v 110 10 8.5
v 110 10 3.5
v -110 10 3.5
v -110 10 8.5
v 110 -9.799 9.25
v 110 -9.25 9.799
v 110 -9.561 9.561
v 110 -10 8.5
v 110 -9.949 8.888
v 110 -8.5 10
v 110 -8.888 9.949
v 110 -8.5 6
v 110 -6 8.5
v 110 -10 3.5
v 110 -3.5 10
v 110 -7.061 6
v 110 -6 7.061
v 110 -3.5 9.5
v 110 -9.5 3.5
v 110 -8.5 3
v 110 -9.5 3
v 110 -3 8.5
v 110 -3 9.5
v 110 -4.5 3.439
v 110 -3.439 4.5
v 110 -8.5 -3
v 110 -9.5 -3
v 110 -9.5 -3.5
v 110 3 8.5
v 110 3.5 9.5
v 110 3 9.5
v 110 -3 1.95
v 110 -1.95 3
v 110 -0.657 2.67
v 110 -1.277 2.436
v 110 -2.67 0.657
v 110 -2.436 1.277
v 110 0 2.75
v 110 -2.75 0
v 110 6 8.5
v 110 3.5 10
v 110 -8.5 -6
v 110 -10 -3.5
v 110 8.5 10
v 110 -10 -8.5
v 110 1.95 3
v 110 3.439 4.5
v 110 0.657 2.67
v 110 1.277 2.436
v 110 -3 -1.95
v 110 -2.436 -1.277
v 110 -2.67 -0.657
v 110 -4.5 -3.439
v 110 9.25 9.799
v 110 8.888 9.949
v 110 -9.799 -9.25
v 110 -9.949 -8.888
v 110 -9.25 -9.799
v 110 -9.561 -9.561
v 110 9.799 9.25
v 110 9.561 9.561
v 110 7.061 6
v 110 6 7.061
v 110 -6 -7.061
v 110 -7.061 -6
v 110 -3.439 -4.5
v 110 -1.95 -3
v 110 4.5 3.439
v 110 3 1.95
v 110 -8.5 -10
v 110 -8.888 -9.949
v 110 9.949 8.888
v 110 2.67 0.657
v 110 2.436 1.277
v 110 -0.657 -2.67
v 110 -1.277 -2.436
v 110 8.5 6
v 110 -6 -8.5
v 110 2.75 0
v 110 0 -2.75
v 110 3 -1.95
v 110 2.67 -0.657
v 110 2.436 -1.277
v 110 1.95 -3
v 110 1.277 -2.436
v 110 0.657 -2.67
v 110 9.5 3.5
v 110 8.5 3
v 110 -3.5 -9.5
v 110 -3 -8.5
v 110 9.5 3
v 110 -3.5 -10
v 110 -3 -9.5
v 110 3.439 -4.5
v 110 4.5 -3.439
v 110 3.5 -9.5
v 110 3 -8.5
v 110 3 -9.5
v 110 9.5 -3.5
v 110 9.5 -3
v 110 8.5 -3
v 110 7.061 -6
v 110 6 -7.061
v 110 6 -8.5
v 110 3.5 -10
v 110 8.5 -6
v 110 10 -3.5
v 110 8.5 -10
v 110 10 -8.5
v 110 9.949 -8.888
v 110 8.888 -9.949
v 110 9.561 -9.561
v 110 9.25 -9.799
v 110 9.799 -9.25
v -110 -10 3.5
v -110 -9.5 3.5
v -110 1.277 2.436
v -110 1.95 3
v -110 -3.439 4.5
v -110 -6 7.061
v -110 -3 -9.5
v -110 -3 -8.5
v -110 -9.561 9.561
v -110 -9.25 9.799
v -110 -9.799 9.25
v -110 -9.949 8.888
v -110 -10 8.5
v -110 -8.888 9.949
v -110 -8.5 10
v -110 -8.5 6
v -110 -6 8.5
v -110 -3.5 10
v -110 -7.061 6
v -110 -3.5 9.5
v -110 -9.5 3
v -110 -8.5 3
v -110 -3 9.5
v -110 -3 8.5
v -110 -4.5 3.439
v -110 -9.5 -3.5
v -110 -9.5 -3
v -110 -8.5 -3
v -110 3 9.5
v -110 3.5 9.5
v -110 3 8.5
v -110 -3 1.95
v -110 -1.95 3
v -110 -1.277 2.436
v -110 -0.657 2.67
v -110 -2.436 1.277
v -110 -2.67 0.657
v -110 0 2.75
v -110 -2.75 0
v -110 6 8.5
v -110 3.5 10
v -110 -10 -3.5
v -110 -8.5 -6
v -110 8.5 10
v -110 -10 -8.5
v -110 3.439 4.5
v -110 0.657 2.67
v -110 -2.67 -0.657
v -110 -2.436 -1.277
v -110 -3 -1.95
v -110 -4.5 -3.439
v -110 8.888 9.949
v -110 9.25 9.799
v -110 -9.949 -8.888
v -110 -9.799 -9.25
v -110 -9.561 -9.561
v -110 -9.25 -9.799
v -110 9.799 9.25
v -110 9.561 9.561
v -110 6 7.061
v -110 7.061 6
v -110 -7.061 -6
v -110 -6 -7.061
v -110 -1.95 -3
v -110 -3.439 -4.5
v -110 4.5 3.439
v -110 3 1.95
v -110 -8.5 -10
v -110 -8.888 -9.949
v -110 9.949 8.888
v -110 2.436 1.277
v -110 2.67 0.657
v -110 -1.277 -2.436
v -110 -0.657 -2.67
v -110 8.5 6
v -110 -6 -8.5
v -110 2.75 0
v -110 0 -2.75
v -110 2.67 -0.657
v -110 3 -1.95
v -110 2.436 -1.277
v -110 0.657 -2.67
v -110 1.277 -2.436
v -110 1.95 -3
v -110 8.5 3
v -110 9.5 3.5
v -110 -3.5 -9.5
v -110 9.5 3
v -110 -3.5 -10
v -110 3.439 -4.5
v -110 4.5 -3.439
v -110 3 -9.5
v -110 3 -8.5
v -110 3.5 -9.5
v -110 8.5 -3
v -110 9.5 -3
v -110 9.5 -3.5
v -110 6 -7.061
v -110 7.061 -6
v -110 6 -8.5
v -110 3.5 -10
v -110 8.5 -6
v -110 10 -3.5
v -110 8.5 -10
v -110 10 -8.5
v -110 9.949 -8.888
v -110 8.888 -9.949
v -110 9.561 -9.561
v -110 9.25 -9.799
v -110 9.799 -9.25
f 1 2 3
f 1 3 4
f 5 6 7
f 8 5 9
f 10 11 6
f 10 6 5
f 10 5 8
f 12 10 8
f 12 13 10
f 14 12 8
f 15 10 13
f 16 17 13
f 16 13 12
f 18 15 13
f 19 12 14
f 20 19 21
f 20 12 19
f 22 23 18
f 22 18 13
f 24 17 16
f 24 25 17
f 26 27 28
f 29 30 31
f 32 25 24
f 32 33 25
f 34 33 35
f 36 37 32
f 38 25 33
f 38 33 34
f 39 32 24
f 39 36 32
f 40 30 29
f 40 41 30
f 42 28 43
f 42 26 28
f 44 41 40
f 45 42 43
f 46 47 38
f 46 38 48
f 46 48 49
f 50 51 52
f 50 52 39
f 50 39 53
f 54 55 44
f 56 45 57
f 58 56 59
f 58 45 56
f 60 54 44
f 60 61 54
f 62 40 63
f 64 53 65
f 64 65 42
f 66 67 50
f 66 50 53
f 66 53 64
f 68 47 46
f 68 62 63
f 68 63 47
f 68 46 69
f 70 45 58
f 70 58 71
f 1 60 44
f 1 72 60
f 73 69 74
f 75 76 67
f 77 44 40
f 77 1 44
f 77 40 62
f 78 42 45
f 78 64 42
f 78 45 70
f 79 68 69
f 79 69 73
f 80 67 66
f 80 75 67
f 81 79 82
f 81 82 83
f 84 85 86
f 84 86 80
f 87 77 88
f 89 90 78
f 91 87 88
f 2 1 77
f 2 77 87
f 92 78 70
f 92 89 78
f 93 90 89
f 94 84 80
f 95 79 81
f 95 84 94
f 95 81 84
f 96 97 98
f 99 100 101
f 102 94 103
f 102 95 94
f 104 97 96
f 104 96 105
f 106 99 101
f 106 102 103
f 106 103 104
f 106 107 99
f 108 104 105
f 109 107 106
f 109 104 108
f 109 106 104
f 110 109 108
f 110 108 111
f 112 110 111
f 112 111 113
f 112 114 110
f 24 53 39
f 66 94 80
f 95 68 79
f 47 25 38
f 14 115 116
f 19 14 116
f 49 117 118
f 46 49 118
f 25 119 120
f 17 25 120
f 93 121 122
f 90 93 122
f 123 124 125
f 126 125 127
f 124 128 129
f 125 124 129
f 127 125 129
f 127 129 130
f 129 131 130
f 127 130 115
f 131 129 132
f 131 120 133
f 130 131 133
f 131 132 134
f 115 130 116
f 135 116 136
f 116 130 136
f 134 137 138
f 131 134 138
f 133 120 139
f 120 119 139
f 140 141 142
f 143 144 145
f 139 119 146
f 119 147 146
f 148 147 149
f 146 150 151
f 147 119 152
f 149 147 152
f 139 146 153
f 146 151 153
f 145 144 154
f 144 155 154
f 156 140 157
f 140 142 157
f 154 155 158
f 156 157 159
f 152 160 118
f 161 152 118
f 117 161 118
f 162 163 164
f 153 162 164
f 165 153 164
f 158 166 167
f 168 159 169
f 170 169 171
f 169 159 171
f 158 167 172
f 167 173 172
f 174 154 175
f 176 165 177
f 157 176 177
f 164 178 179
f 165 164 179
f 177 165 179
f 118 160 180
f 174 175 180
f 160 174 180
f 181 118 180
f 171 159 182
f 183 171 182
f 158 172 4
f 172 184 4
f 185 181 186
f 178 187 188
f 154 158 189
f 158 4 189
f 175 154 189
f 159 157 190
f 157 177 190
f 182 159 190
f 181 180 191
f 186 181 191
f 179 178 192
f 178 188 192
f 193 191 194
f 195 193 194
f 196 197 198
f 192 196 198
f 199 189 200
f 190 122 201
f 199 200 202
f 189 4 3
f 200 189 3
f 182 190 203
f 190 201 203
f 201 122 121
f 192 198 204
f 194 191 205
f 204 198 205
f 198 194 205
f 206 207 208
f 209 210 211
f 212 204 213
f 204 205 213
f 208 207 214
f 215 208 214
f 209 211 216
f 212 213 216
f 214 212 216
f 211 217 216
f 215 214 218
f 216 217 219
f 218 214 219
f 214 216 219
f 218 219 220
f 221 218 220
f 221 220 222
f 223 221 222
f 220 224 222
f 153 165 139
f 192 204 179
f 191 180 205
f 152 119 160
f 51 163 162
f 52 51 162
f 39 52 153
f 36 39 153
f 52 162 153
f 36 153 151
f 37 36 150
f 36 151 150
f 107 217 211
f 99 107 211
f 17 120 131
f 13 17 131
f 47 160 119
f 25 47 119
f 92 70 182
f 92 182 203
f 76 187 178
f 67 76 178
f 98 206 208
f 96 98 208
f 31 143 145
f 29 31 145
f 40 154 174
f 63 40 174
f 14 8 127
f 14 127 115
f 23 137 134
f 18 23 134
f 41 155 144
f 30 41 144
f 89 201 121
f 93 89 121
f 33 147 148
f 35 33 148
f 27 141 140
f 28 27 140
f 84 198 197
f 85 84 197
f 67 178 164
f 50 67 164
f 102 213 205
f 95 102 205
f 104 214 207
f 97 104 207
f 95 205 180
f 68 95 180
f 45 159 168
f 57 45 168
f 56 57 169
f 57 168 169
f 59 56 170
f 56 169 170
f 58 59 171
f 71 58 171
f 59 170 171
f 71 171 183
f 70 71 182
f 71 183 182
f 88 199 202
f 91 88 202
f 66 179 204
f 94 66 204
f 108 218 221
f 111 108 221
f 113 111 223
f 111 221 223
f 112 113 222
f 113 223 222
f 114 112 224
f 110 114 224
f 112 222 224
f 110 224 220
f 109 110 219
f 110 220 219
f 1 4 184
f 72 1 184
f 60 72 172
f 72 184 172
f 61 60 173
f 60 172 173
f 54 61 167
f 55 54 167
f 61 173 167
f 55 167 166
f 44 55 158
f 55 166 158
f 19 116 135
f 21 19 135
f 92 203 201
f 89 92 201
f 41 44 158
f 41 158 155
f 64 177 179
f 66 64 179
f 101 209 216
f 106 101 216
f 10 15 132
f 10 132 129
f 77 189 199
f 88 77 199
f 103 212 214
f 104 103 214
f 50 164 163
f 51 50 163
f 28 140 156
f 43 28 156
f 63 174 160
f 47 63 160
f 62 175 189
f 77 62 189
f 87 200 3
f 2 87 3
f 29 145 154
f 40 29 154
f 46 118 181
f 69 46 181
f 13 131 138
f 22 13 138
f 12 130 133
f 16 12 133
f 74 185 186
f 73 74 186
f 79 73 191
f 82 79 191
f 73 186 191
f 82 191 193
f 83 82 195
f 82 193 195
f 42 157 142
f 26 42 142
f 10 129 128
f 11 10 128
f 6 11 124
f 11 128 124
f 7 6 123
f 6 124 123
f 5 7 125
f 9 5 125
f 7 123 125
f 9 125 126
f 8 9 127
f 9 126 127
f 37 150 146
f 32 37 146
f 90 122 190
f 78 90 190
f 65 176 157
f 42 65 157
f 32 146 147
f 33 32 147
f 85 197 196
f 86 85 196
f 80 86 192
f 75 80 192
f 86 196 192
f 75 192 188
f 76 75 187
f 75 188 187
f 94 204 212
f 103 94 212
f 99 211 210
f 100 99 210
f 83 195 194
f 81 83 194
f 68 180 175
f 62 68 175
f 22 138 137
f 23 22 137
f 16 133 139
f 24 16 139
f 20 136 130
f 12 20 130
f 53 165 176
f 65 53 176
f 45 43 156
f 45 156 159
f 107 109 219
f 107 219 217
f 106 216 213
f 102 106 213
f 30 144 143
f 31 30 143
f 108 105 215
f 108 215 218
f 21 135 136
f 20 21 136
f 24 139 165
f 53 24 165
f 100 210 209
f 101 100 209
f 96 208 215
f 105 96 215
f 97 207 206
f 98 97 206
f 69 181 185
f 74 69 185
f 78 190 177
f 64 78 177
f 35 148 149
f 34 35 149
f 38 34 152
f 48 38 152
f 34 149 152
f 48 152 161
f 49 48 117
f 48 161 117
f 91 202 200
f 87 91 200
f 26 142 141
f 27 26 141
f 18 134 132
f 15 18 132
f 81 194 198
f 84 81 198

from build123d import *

# Parameters (mm, degrees)
BR_EXTRUDE_DEPTH      = 110
BR_EXTRUDE_DEPTH_BACK = 110


with BuildPart() as part:
    # Sketch2 → BR_Extrude (new, two sides: drawn at the far end of the back side and taken through both)
    with BuildSketch(Plane(origin=(0, 0, 0), x_dir=(0, 0, -1), z_dir=(1, 0, 0)).offset(-BR_EXTRUDE_DEPTH_BACK)):
        with BuildLine():
            Line((-7.060660172, -6), (-8.5, -6))
            Line((-8.5, -6), (-8.5, -3))
            Line((-8.5, -3), (-9.5, -3))
            Line((-9.5, -3), (-9.5, -3.5))
            Line((-9.5, -3.5), (-10, -3.5))
            Line((-10, -3.5), (-10, -8.5))
            ThreePointArc((-10, -8.5), (-9.560660172, -9.560660172), (-8.5, -10))
            Line((-8.5, -10), (-3.5, -10))
            Line((-3.5, -10), (-3.5, -9.5))
            Line((-3.5, -9.5), (-3, -9.5))
            Line((-3, -9.5), (-3, -8.5))
            Line((-3, -8.5), (-6, -8.5))
            Line((-6, -8.5), (-6, -7.060660172))
            Line((-6, -7.060660172), (-3.439339828, -4.5))
            Line((-3.439339828, -4.5), (3.439339828, -4.5))
            Line((3.439339828, -4.5), (6, -7.060660172))
            Line((6, -7.060660172), (6, -8.5))
            Line((6, -8.5), (3, -8.5))
            Line((3, -8.5), (3, -9.5))
            Line((3, -9.5), (3.5, -9.5))
            Line((3.5, -9.5), (3.5, -10))
            Line((3.5, -10), (8.5, -10))
            ThreePointArc((8.5, -10), (9.560660172, -9.560660172), (10, -8.5))
            Line((10, -8.5), (10, -3.5))
            Line((10, -3.5), (9.5, -3.5))
            Line((9.5, -3.5), (9.5, -3))
            Line((9.5, -3), (8.5, -3))
            Line((8.5, -3), (8.5, -6))
            Line((8.5, -6), (7.060660172, -6))
            Line((7.060660172, -6), (4.5, -3.439339828))
            Line((4.5, -3.439339828), (4.5, 3.439339828))
            Line((4.5, 3.439339828), (7.060660172, 6))
            Line((7.060660172, 6), (8.5, 6))
            Line((8.5, 6), (8.5, 3))
            Line((8.5, 3), (9.5, 3))
            Line((9.5, 3), (9.5, 3.5))
            Line((9.5, 3.5), (10, 3.5))
            Line((10, 3.5), (10, 8.5))
            ThreePointArc((10, 8.5), (9.560660172, 9.560660172), (8.5, 10))
            Line((8.5, 10), (3.5, 10))
            Line((3.5, 10), (3.5, 9.5))
            Line((3.5, 9.5), (3, 9.5))
            Line((3, 9.5), (3, 8.5))
            Line((3, 8.5), (6, 8.5))
            Line((6, 8.5), (6, 7.060660172))
            Line((6, 7.060660172), (3.439339828, 4.5))
            Line((3.439339828, 4.5), (-3.439339828, 4.5))
            Line((-3.439339828, 4.5), (-6, 7.060660172))
            Line((-6, 7.060660172), (-6, 8.5))
            Line((-6, 8.5), (-3, 8.5))
            Line((-3, 8.5), (-3, 9.5))
            Line((-3, 9.5), (-3.5, 9.5))
            Line((-3.5, 9.5), (-3.5, 10))
            Line((-3.5, 10), (-8.5, 10))
            ThreePointArc((-8.5, 10), (-9.560660172, 9.560660172), (-10, 8.5))
            Line((-10, 8.5), (-10, 3.5))
            Line((-10, 3.5), (-9.5, 3.5))
            Line((-9.5, 3.5), (-9.5, 3))
            Line((-9.5, 3), (-8.5, 3))
            Line((-8.5, 3), (-8.5, 6))
            Line((-8.5, 6), (-7.060660172, 6))
            Line((-7.060660172, 6), (-4.5, 3.439339828))
            Line((-4.5, 3.439339828), (-4.5, -3.439339828))
            Line((-4.5, -3.439339828), (-7.060660172, -6))
        make_face()
        with BuildLine():
            Line((-3.000174203, -1.949573265), (-2.435636363, -1.276783266))
            ThreePointArc((-2.435636363, -1.276783266), (-2.75, 0), (-2.435636363, 1.276783266))
            Line((-2.435636363, 1.276783266), (-3.000174203, 1.949573265))
            Line((-3.000174203, 1.949573265), (-1.949573265, 3.000174203))
            Line((-1.949573265, 3.000174203), (-1.276783266, 2.435636363))
            ThreePointArc((-1.276783266, 2.435636363), (0, 2.75), (1.276783266, 2.435636363))
            Line((1.276783266, 2.435636363), (1.949573265, 3.000174203))
            Line((1.949573265, 3.000174203), (3.000174203, 1.949573265))
            Line((3.000174203, 1.949573265), (2.435636363, 1.276783266))
            ThreePointArc((2.435636363, 1.276783266), (2.75, 0), (2.435636363, -1.276783266))
            Line((2.435636363, -1.276783266), (3.000174203, -1.949573265))
            Line((3.000174203, -1.949573265), (1.949573265, -3.000174203))
            Line((1.949573265, -3.000174203), (1.276783266, -2.435636363))
            ThreePointArc((1.276783266, -2.435636363), (0, -2.75), (-1.276783266, -2.435636363))
            Line((-1.276783266, -2.435636363), (-1.949573265, -3.000174203))
            Line((-1.949573265, -3.000174203), (-3.000174203, -1.949573265))
        make_face(mode=Mode.SUBTRACT)
    extrude(amount=BR_EXTRUDE_DEPTH + BR_EXTRUDE_DEPTH_BACK)


solid = part.part
